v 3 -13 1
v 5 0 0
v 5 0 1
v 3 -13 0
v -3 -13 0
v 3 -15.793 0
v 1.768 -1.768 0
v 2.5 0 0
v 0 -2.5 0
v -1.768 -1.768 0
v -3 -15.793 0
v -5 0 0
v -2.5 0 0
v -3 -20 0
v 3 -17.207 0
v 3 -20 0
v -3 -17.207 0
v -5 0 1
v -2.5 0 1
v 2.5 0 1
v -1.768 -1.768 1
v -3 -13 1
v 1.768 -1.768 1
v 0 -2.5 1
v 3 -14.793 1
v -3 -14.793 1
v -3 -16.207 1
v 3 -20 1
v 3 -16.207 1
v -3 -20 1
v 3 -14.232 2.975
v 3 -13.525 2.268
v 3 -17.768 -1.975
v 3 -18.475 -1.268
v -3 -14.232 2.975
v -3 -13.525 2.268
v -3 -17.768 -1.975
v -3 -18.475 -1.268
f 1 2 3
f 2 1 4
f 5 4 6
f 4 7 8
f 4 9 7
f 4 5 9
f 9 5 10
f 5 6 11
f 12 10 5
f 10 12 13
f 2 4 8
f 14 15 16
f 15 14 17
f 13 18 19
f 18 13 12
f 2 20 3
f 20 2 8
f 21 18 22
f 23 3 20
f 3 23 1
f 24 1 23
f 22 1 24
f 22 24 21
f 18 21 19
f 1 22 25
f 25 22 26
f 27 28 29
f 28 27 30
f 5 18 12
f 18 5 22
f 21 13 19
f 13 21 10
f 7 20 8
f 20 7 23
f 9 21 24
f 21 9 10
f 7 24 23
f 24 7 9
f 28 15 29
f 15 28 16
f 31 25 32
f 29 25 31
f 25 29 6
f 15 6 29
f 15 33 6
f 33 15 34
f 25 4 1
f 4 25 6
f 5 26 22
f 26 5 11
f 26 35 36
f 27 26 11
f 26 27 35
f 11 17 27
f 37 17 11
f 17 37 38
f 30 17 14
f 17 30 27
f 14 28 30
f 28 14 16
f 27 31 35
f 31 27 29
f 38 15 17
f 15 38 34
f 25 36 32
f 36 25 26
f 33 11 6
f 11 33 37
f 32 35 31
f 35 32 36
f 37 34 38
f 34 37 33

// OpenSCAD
// Parameters
terminal_type = 0; //[0:1:1]
material_thickness_mm = 1.0; //[0.5:2.0:0.1]
outer_diameter_mm = 10.0; //[5.0:20.0:0.5]
inner_diameter_mm = 5.0; //[2.5:10.0:0.5]
lug_width_mm = 6.0; //[3.0:12.0:0.5]
overall_length_mm = 20.0; //[10.0:40.0:1]
crimp_length_mm = 0.0; //[0.0:30.0:0.5]
wire_entry_hole_diameter_mm = 0.0; //[0.0:8.0:0.5]
bend_angle_deg = 45; //[0:90:5]
transition_length_mm = 1.0; //[0.5:3.0:0.1]
overlap_mm = 1.0; //[0.5:2.0:0.1]
lug_stem_length_mm = 8.0; //[4.0:20.0:0.5]
barrel_outer_diameter_mm = 6.0; //[3.0:12.0:0.5]

// Ring Lug Plate
module ring_lug_plate() {
  color("Silver") {
    difference() {
      linear_extrude(height=material_thickness_mm) {
        polygon(points=[
          [-outer_diameter_mm/2, 0],
          [outer_diameter_mm/2, 0],
          [lug_width_mm/2, -(outer_diameter_mm/2 + lug_stem_length_mm)],
          [-lug_width_mm/2, -(outer_diameter_mm/2 + lug_stem_length_mm)]
        ]);
      }
      translate([0, 0, material_thickness_mm/2])
        cylinder(r=inner_diameter_mm/2, h=material_thickness_mm + 2*overlap_mm, center=true);
    }
  }
}

// Crimp Barrel
module crimp_barrel() {
  color("Silver") {
    difference() {
      rotate([90, 0, 0])
        translate([0, -(outer_diameter_mm/2 + lug_stem_length_mm + transition_length_mm - overlap_mm), material_thickness_mm/2 + crimp_length_mm/2])
        cylinder(r=barrel_outer_diameter_mm/2, h=crimp_length_mm, center=true);
      rotate([90, 0, 0])
        translate([0, -(outer_diameter_mm/2 + lug_stem_length_mm + transition_length_mm - overlap_mm), material_thickness_mm/2 + crimp_length_mm/2])
        cylinder(r=(barrel_outer_diameter_mm - 2*material_thickness_mm)/2, h=crimp_length_mm + 2*overlap_mm, center=true);
    }
  }
}

// Non-Crimp Tongue with Optional Hole
module non_crimp_tongue_with_optional_hole() {
  color("Silver") {
    difference() {
      translate([0, -(outer_diameter_mm/2 + lug_stem_length_mm + transition_length_mm + ((overall_length_mm - (outer_diameter_mm/2 + lug_stem_length_mm + transition_length_mm)) + overlap_mm)/2 - overlap_mm), material_thickness_mm/2])
        cube([lug_width_mm, (overall_length_mm - (outer_diameter_mm/2 + lug_stem_length_mm + transition_length_mm)) + overlap_mm, material_thickness_mm], center=true);
      if (wire_entry_hole_diameter_mm > 0) {
        translate([0, -(overall_length_mm - lug_width_mm/2), material_thickness_mm/2])
          cylinder(r=wire_entry_hole_diameter_mm/2, h=material_thickness_mm + 2*overlap_mm, center=true);
      }
    }
  }
}

// Non-Crimp Attachment Union
module non_crimp_attachment_union() {
  color("Silver") {
    union() {
      translate([0, -(outer_diameter_mm/2 + lug_stem_length_mm + (transition_length_mm + overlap_mm)/2 - overlap_mm), material_thickness_mm/2])
        cube([lug_width_mm, transition_length_mm + overlap_mm, material_thickness_mm], center=true);
      non_crimp_tongue_with_optional_hole();
      translate([0, -(outer_diameter_mm/2 + lug_stem_length_mm + transition_length_mm + (overall_length_mm - (outer_diameter_mm/2 + lug_stem_length_mm + transition_length_mm))/2 - overlap_mm), material_thickness_mm/2])
        rotate([bend_angle_deg, 0, 0])
        cube([lug_width_mm, (overall_length_mm - (outer_diameter_mm/2 + lug_stem_length_mm + transition_length_mm)), material_thickness_mm], center=true);
    }
  }
}

// Ring Terminal
module ring_terminal() {
  union() {
    ring_lug_plate();
    if (terminal_type == 0) {
      non_crimp_attachment_union();
    }
  }
}

// Ring Terminal Assembly
module ring_terminal_assembly() {
  union() {
    ring_terminal();
    if (terminal_type == 1) {
      translate([0, 0, 0]) crimp_barrel();
    }
  }
}

// Final Assembly
module assembly() {
  ring_terminal_assembly();
}

assembly();
